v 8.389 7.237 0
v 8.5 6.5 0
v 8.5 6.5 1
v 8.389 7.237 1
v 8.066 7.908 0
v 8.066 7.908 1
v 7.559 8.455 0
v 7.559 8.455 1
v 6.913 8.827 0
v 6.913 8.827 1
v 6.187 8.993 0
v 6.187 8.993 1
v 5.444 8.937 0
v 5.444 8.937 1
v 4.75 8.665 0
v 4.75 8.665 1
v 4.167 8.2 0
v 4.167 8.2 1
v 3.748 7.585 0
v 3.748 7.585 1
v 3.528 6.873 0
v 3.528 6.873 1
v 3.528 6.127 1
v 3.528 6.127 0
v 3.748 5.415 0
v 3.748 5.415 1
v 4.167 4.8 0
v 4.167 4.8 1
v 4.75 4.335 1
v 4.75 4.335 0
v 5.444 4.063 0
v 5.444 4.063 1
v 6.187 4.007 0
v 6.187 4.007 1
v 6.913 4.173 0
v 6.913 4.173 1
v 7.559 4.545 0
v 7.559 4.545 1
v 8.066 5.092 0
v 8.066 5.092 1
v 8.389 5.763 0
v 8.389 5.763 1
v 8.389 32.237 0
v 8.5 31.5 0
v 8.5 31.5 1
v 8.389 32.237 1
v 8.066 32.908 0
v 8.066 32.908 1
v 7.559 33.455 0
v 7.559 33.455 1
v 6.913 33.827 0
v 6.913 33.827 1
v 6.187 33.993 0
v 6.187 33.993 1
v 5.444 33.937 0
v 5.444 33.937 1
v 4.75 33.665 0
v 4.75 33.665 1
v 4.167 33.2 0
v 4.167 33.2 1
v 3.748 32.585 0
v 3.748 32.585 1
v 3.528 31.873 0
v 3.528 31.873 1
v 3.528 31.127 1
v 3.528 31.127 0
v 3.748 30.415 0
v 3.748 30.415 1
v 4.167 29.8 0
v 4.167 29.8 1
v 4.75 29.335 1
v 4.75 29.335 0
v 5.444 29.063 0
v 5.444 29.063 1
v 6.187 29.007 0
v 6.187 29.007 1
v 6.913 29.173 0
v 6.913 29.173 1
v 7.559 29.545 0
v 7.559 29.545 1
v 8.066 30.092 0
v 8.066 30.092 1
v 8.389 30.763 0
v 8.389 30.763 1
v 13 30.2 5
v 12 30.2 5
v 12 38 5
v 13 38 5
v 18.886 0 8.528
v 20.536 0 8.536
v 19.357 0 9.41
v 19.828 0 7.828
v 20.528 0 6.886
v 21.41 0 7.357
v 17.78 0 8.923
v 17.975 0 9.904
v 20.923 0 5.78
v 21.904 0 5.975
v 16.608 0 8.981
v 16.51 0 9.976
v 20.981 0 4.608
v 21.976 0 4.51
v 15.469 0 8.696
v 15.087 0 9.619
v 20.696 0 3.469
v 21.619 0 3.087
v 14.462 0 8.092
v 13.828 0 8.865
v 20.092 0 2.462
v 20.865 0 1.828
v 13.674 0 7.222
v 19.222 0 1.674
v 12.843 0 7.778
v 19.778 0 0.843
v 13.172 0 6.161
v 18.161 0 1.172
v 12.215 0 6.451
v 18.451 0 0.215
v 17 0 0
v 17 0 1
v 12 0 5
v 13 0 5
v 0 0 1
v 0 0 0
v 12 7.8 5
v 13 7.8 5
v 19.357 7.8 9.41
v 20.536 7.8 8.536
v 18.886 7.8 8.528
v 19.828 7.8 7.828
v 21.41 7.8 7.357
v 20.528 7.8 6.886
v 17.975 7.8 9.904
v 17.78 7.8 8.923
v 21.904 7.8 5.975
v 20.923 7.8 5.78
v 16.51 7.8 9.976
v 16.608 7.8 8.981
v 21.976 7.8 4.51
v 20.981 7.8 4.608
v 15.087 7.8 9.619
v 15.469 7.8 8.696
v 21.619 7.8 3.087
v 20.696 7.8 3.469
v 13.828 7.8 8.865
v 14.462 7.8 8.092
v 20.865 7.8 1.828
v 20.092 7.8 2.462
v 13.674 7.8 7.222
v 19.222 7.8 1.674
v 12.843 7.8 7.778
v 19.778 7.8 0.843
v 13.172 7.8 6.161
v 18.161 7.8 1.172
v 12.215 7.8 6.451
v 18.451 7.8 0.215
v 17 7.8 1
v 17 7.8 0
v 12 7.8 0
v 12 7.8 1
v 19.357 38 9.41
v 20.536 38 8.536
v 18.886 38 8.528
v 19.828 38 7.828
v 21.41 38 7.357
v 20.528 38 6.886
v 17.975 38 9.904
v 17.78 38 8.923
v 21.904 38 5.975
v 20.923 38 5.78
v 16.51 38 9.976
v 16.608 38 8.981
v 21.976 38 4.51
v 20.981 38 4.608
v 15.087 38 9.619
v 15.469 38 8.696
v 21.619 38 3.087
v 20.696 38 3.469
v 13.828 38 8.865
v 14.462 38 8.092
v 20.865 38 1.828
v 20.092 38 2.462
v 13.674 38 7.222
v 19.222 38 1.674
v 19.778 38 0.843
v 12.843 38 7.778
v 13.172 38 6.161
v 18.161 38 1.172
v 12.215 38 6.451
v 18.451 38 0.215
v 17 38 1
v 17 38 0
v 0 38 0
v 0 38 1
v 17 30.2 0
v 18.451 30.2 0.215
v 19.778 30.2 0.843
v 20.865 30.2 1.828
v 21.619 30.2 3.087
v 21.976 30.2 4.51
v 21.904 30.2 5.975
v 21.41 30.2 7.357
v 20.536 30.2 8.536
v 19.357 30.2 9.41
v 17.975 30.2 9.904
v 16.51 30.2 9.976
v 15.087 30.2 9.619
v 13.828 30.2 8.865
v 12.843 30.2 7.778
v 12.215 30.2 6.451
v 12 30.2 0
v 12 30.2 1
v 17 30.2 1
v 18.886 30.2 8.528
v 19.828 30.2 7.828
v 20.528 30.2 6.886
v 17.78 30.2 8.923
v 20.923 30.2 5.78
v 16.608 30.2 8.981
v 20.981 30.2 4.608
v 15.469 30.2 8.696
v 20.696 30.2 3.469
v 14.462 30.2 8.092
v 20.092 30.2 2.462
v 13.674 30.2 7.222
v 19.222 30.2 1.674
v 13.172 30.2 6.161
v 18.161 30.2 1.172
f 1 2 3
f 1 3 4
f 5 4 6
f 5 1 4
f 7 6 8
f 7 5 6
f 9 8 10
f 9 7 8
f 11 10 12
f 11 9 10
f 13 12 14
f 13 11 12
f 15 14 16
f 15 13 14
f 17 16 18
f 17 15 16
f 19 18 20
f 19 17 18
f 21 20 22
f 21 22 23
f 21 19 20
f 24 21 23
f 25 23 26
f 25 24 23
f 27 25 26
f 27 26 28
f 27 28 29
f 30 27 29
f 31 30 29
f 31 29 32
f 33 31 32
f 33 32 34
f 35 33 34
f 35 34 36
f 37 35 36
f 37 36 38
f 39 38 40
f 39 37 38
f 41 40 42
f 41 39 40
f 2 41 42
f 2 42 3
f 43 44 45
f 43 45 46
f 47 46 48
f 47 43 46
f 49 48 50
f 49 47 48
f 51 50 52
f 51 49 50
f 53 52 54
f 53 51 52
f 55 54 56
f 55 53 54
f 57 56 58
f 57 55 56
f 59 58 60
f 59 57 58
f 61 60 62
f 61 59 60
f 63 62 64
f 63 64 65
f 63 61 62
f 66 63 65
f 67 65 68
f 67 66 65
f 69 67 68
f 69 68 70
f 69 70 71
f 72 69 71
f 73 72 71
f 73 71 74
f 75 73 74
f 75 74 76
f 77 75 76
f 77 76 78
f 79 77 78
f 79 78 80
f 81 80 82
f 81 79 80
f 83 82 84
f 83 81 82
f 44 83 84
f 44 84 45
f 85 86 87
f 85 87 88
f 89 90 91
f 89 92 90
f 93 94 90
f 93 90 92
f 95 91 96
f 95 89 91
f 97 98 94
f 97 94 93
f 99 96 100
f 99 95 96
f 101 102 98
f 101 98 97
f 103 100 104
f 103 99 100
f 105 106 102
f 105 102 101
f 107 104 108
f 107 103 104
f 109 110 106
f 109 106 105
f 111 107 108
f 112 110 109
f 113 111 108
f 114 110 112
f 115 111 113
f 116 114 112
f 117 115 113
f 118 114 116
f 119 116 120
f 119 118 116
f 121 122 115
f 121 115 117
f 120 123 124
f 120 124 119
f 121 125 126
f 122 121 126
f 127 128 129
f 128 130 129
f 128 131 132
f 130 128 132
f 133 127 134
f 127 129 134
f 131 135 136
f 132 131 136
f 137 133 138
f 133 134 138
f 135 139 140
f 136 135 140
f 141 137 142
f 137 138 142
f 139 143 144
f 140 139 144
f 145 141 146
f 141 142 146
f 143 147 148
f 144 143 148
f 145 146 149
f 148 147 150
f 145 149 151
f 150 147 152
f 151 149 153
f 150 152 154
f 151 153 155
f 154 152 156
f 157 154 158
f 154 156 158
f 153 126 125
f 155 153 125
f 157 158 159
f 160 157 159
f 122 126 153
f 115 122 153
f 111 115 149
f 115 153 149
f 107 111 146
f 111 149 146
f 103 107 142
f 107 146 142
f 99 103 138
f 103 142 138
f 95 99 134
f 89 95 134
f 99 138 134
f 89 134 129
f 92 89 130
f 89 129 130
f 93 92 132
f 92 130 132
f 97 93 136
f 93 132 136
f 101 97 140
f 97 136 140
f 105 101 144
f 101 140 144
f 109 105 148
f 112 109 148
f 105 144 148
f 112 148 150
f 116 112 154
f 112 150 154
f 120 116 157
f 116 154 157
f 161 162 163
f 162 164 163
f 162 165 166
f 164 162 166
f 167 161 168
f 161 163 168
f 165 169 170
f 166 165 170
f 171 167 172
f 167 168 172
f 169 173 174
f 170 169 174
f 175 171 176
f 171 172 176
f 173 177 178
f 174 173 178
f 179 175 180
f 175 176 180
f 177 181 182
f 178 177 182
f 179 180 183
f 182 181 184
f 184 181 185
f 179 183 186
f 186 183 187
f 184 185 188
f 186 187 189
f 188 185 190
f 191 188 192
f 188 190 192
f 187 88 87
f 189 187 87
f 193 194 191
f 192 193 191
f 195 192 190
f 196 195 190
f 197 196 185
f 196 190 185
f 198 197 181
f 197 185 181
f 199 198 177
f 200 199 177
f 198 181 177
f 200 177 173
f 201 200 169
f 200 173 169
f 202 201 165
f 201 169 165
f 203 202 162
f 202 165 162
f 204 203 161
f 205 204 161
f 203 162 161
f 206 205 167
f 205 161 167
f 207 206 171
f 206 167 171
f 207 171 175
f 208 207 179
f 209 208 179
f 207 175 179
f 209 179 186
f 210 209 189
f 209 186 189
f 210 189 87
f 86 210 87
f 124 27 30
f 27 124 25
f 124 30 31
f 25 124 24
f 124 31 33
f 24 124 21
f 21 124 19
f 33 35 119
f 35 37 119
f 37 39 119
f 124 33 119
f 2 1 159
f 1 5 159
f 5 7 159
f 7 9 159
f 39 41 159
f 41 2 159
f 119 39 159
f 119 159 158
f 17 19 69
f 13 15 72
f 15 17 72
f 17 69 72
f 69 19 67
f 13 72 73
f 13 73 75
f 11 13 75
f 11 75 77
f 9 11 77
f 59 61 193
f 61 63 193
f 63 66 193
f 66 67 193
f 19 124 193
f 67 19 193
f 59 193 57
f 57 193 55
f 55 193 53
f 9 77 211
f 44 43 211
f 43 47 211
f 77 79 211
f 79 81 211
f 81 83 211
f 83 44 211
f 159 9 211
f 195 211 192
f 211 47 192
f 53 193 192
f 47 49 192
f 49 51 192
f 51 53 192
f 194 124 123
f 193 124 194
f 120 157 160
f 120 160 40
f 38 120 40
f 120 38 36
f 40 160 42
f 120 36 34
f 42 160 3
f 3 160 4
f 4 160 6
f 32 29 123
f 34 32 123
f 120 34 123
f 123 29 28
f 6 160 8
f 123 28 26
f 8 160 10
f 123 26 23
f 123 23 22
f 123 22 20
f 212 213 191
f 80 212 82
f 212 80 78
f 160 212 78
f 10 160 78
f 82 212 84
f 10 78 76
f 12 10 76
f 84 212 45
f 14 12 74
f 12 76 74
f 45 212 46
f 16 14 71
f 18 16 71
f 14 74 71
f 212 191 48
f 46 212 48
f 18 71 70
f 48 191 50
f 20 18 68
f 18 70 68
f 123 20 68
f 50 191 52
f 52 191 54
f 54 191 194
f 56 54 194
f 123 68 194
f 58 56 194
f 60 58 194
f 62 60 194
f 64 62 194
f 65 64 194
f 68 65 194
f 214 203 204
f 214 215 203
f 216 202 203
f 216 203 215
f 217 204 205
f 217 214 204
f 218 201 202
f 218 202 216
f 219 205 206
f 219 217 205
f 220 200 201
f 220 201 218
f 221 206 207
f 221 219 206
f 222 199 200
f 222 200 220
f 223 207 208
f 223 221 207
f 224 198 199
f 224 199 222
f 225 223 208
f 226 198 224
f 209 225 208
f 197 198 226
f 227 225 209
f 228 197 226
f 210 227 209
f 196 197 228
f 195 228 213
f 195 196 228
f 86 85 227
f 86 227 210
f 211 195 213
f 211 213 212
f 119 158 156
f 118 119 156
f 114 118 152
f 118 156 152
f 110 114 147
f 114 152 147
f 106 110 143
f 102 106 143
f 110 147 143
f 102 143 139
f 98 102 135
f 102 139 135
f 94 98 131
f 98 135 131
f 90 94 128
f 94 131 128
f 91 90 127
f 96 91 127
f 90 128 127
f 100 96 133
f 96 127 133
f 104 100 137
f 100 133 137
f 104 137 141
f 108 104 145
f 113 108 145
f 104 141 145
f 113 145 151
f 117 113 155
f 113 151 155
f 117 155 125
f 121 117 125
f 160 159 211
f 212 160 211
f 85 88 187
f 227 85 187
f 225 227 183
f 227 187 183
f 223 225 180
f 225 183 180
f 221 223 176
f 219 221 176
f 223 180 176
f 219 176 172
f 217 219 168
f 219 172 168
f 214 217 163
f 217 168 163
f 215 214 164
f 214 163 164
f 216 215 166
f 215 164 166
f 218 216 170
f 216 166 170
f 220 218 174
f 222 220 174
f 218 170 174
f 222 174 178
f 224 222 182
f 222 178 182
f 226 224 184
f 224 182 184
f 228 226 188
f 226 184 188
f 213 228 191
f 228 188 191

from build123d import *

# Parameters (mm, degrees)
SKETCH_1_W      = 12
SKETCH_1_H      = 38
SKETCH_1_R      = 2.5
EXTRUDE_1_DEPTH = 1
EXTRUDE_2_DEPTH = 7.8
EXTRUDE_START   = -30.2
EXTRUDE_3_DEPTH = 7.8


with BuildPart() as part:
    # 草图1 → 凸台-拉伸1 (new body)
    with BuildSketch(Plane.XY):
        with Locations((6, 19)):
            Rectangle(SKETCH_1_W, SKETCH_1_H)
        with Locations((6, 31.5)):
            Circle(SKETCH_1_R, mode=Mode.SUBTRACT)
        with Locations((6, 6.5)):
            Circle(SKETCH_1_R, mode=Mode.SUBTRACT)
    extrude(amount=EXTRUDE_1_DEPTH)

    # 草图2 → 凸台-拉伸2 (add)
    with BuildSketch(Plane(origin=(0, 38, 0), x_dir=(1, 0, 0), z_dir=(0, 1, 0))):
        with BuildLine():
            Line((12, 0), (17, 0))
            ThreePointArc((17, 0), (20.535533906, -8.535533906), (12, -5))
            Line((12, -5), (13, -5))
            ThreePointArc((13, -5), (19.828427125, -7.828427125), (17, -1))
            Line((17, -1), (12, -1))
            Line((12, -1), (12, 0))
        make_face()
    extrude(amount=-EXTRUDE_2_DEPTH)

    # 草图2<2> → 凸台-拉伸3 (add)
    with BuildSketch(Plane(origin=(0, 38, 0), x_dir=(1, 0, 0), z_dir=(0, 1, 0)).offset(EXTRUDE_START)):
        with BuildLine():
            Line((12, 0), (17, 0))
            ThreePointArc((17, 0), (20.535533906, -8.535533906), (12, -5))
            Line((12, -5), (13, -5))
            ThreePointArc((13, -5), (19.828427125, -7.828427125), (17, -1))
            Line((17, -1), (12, -1))
            Line((12, -1), (12, 0))
        make_face()
    extrude(amount=-EXTRUDE_3_DEPTH)


solid = part.part
